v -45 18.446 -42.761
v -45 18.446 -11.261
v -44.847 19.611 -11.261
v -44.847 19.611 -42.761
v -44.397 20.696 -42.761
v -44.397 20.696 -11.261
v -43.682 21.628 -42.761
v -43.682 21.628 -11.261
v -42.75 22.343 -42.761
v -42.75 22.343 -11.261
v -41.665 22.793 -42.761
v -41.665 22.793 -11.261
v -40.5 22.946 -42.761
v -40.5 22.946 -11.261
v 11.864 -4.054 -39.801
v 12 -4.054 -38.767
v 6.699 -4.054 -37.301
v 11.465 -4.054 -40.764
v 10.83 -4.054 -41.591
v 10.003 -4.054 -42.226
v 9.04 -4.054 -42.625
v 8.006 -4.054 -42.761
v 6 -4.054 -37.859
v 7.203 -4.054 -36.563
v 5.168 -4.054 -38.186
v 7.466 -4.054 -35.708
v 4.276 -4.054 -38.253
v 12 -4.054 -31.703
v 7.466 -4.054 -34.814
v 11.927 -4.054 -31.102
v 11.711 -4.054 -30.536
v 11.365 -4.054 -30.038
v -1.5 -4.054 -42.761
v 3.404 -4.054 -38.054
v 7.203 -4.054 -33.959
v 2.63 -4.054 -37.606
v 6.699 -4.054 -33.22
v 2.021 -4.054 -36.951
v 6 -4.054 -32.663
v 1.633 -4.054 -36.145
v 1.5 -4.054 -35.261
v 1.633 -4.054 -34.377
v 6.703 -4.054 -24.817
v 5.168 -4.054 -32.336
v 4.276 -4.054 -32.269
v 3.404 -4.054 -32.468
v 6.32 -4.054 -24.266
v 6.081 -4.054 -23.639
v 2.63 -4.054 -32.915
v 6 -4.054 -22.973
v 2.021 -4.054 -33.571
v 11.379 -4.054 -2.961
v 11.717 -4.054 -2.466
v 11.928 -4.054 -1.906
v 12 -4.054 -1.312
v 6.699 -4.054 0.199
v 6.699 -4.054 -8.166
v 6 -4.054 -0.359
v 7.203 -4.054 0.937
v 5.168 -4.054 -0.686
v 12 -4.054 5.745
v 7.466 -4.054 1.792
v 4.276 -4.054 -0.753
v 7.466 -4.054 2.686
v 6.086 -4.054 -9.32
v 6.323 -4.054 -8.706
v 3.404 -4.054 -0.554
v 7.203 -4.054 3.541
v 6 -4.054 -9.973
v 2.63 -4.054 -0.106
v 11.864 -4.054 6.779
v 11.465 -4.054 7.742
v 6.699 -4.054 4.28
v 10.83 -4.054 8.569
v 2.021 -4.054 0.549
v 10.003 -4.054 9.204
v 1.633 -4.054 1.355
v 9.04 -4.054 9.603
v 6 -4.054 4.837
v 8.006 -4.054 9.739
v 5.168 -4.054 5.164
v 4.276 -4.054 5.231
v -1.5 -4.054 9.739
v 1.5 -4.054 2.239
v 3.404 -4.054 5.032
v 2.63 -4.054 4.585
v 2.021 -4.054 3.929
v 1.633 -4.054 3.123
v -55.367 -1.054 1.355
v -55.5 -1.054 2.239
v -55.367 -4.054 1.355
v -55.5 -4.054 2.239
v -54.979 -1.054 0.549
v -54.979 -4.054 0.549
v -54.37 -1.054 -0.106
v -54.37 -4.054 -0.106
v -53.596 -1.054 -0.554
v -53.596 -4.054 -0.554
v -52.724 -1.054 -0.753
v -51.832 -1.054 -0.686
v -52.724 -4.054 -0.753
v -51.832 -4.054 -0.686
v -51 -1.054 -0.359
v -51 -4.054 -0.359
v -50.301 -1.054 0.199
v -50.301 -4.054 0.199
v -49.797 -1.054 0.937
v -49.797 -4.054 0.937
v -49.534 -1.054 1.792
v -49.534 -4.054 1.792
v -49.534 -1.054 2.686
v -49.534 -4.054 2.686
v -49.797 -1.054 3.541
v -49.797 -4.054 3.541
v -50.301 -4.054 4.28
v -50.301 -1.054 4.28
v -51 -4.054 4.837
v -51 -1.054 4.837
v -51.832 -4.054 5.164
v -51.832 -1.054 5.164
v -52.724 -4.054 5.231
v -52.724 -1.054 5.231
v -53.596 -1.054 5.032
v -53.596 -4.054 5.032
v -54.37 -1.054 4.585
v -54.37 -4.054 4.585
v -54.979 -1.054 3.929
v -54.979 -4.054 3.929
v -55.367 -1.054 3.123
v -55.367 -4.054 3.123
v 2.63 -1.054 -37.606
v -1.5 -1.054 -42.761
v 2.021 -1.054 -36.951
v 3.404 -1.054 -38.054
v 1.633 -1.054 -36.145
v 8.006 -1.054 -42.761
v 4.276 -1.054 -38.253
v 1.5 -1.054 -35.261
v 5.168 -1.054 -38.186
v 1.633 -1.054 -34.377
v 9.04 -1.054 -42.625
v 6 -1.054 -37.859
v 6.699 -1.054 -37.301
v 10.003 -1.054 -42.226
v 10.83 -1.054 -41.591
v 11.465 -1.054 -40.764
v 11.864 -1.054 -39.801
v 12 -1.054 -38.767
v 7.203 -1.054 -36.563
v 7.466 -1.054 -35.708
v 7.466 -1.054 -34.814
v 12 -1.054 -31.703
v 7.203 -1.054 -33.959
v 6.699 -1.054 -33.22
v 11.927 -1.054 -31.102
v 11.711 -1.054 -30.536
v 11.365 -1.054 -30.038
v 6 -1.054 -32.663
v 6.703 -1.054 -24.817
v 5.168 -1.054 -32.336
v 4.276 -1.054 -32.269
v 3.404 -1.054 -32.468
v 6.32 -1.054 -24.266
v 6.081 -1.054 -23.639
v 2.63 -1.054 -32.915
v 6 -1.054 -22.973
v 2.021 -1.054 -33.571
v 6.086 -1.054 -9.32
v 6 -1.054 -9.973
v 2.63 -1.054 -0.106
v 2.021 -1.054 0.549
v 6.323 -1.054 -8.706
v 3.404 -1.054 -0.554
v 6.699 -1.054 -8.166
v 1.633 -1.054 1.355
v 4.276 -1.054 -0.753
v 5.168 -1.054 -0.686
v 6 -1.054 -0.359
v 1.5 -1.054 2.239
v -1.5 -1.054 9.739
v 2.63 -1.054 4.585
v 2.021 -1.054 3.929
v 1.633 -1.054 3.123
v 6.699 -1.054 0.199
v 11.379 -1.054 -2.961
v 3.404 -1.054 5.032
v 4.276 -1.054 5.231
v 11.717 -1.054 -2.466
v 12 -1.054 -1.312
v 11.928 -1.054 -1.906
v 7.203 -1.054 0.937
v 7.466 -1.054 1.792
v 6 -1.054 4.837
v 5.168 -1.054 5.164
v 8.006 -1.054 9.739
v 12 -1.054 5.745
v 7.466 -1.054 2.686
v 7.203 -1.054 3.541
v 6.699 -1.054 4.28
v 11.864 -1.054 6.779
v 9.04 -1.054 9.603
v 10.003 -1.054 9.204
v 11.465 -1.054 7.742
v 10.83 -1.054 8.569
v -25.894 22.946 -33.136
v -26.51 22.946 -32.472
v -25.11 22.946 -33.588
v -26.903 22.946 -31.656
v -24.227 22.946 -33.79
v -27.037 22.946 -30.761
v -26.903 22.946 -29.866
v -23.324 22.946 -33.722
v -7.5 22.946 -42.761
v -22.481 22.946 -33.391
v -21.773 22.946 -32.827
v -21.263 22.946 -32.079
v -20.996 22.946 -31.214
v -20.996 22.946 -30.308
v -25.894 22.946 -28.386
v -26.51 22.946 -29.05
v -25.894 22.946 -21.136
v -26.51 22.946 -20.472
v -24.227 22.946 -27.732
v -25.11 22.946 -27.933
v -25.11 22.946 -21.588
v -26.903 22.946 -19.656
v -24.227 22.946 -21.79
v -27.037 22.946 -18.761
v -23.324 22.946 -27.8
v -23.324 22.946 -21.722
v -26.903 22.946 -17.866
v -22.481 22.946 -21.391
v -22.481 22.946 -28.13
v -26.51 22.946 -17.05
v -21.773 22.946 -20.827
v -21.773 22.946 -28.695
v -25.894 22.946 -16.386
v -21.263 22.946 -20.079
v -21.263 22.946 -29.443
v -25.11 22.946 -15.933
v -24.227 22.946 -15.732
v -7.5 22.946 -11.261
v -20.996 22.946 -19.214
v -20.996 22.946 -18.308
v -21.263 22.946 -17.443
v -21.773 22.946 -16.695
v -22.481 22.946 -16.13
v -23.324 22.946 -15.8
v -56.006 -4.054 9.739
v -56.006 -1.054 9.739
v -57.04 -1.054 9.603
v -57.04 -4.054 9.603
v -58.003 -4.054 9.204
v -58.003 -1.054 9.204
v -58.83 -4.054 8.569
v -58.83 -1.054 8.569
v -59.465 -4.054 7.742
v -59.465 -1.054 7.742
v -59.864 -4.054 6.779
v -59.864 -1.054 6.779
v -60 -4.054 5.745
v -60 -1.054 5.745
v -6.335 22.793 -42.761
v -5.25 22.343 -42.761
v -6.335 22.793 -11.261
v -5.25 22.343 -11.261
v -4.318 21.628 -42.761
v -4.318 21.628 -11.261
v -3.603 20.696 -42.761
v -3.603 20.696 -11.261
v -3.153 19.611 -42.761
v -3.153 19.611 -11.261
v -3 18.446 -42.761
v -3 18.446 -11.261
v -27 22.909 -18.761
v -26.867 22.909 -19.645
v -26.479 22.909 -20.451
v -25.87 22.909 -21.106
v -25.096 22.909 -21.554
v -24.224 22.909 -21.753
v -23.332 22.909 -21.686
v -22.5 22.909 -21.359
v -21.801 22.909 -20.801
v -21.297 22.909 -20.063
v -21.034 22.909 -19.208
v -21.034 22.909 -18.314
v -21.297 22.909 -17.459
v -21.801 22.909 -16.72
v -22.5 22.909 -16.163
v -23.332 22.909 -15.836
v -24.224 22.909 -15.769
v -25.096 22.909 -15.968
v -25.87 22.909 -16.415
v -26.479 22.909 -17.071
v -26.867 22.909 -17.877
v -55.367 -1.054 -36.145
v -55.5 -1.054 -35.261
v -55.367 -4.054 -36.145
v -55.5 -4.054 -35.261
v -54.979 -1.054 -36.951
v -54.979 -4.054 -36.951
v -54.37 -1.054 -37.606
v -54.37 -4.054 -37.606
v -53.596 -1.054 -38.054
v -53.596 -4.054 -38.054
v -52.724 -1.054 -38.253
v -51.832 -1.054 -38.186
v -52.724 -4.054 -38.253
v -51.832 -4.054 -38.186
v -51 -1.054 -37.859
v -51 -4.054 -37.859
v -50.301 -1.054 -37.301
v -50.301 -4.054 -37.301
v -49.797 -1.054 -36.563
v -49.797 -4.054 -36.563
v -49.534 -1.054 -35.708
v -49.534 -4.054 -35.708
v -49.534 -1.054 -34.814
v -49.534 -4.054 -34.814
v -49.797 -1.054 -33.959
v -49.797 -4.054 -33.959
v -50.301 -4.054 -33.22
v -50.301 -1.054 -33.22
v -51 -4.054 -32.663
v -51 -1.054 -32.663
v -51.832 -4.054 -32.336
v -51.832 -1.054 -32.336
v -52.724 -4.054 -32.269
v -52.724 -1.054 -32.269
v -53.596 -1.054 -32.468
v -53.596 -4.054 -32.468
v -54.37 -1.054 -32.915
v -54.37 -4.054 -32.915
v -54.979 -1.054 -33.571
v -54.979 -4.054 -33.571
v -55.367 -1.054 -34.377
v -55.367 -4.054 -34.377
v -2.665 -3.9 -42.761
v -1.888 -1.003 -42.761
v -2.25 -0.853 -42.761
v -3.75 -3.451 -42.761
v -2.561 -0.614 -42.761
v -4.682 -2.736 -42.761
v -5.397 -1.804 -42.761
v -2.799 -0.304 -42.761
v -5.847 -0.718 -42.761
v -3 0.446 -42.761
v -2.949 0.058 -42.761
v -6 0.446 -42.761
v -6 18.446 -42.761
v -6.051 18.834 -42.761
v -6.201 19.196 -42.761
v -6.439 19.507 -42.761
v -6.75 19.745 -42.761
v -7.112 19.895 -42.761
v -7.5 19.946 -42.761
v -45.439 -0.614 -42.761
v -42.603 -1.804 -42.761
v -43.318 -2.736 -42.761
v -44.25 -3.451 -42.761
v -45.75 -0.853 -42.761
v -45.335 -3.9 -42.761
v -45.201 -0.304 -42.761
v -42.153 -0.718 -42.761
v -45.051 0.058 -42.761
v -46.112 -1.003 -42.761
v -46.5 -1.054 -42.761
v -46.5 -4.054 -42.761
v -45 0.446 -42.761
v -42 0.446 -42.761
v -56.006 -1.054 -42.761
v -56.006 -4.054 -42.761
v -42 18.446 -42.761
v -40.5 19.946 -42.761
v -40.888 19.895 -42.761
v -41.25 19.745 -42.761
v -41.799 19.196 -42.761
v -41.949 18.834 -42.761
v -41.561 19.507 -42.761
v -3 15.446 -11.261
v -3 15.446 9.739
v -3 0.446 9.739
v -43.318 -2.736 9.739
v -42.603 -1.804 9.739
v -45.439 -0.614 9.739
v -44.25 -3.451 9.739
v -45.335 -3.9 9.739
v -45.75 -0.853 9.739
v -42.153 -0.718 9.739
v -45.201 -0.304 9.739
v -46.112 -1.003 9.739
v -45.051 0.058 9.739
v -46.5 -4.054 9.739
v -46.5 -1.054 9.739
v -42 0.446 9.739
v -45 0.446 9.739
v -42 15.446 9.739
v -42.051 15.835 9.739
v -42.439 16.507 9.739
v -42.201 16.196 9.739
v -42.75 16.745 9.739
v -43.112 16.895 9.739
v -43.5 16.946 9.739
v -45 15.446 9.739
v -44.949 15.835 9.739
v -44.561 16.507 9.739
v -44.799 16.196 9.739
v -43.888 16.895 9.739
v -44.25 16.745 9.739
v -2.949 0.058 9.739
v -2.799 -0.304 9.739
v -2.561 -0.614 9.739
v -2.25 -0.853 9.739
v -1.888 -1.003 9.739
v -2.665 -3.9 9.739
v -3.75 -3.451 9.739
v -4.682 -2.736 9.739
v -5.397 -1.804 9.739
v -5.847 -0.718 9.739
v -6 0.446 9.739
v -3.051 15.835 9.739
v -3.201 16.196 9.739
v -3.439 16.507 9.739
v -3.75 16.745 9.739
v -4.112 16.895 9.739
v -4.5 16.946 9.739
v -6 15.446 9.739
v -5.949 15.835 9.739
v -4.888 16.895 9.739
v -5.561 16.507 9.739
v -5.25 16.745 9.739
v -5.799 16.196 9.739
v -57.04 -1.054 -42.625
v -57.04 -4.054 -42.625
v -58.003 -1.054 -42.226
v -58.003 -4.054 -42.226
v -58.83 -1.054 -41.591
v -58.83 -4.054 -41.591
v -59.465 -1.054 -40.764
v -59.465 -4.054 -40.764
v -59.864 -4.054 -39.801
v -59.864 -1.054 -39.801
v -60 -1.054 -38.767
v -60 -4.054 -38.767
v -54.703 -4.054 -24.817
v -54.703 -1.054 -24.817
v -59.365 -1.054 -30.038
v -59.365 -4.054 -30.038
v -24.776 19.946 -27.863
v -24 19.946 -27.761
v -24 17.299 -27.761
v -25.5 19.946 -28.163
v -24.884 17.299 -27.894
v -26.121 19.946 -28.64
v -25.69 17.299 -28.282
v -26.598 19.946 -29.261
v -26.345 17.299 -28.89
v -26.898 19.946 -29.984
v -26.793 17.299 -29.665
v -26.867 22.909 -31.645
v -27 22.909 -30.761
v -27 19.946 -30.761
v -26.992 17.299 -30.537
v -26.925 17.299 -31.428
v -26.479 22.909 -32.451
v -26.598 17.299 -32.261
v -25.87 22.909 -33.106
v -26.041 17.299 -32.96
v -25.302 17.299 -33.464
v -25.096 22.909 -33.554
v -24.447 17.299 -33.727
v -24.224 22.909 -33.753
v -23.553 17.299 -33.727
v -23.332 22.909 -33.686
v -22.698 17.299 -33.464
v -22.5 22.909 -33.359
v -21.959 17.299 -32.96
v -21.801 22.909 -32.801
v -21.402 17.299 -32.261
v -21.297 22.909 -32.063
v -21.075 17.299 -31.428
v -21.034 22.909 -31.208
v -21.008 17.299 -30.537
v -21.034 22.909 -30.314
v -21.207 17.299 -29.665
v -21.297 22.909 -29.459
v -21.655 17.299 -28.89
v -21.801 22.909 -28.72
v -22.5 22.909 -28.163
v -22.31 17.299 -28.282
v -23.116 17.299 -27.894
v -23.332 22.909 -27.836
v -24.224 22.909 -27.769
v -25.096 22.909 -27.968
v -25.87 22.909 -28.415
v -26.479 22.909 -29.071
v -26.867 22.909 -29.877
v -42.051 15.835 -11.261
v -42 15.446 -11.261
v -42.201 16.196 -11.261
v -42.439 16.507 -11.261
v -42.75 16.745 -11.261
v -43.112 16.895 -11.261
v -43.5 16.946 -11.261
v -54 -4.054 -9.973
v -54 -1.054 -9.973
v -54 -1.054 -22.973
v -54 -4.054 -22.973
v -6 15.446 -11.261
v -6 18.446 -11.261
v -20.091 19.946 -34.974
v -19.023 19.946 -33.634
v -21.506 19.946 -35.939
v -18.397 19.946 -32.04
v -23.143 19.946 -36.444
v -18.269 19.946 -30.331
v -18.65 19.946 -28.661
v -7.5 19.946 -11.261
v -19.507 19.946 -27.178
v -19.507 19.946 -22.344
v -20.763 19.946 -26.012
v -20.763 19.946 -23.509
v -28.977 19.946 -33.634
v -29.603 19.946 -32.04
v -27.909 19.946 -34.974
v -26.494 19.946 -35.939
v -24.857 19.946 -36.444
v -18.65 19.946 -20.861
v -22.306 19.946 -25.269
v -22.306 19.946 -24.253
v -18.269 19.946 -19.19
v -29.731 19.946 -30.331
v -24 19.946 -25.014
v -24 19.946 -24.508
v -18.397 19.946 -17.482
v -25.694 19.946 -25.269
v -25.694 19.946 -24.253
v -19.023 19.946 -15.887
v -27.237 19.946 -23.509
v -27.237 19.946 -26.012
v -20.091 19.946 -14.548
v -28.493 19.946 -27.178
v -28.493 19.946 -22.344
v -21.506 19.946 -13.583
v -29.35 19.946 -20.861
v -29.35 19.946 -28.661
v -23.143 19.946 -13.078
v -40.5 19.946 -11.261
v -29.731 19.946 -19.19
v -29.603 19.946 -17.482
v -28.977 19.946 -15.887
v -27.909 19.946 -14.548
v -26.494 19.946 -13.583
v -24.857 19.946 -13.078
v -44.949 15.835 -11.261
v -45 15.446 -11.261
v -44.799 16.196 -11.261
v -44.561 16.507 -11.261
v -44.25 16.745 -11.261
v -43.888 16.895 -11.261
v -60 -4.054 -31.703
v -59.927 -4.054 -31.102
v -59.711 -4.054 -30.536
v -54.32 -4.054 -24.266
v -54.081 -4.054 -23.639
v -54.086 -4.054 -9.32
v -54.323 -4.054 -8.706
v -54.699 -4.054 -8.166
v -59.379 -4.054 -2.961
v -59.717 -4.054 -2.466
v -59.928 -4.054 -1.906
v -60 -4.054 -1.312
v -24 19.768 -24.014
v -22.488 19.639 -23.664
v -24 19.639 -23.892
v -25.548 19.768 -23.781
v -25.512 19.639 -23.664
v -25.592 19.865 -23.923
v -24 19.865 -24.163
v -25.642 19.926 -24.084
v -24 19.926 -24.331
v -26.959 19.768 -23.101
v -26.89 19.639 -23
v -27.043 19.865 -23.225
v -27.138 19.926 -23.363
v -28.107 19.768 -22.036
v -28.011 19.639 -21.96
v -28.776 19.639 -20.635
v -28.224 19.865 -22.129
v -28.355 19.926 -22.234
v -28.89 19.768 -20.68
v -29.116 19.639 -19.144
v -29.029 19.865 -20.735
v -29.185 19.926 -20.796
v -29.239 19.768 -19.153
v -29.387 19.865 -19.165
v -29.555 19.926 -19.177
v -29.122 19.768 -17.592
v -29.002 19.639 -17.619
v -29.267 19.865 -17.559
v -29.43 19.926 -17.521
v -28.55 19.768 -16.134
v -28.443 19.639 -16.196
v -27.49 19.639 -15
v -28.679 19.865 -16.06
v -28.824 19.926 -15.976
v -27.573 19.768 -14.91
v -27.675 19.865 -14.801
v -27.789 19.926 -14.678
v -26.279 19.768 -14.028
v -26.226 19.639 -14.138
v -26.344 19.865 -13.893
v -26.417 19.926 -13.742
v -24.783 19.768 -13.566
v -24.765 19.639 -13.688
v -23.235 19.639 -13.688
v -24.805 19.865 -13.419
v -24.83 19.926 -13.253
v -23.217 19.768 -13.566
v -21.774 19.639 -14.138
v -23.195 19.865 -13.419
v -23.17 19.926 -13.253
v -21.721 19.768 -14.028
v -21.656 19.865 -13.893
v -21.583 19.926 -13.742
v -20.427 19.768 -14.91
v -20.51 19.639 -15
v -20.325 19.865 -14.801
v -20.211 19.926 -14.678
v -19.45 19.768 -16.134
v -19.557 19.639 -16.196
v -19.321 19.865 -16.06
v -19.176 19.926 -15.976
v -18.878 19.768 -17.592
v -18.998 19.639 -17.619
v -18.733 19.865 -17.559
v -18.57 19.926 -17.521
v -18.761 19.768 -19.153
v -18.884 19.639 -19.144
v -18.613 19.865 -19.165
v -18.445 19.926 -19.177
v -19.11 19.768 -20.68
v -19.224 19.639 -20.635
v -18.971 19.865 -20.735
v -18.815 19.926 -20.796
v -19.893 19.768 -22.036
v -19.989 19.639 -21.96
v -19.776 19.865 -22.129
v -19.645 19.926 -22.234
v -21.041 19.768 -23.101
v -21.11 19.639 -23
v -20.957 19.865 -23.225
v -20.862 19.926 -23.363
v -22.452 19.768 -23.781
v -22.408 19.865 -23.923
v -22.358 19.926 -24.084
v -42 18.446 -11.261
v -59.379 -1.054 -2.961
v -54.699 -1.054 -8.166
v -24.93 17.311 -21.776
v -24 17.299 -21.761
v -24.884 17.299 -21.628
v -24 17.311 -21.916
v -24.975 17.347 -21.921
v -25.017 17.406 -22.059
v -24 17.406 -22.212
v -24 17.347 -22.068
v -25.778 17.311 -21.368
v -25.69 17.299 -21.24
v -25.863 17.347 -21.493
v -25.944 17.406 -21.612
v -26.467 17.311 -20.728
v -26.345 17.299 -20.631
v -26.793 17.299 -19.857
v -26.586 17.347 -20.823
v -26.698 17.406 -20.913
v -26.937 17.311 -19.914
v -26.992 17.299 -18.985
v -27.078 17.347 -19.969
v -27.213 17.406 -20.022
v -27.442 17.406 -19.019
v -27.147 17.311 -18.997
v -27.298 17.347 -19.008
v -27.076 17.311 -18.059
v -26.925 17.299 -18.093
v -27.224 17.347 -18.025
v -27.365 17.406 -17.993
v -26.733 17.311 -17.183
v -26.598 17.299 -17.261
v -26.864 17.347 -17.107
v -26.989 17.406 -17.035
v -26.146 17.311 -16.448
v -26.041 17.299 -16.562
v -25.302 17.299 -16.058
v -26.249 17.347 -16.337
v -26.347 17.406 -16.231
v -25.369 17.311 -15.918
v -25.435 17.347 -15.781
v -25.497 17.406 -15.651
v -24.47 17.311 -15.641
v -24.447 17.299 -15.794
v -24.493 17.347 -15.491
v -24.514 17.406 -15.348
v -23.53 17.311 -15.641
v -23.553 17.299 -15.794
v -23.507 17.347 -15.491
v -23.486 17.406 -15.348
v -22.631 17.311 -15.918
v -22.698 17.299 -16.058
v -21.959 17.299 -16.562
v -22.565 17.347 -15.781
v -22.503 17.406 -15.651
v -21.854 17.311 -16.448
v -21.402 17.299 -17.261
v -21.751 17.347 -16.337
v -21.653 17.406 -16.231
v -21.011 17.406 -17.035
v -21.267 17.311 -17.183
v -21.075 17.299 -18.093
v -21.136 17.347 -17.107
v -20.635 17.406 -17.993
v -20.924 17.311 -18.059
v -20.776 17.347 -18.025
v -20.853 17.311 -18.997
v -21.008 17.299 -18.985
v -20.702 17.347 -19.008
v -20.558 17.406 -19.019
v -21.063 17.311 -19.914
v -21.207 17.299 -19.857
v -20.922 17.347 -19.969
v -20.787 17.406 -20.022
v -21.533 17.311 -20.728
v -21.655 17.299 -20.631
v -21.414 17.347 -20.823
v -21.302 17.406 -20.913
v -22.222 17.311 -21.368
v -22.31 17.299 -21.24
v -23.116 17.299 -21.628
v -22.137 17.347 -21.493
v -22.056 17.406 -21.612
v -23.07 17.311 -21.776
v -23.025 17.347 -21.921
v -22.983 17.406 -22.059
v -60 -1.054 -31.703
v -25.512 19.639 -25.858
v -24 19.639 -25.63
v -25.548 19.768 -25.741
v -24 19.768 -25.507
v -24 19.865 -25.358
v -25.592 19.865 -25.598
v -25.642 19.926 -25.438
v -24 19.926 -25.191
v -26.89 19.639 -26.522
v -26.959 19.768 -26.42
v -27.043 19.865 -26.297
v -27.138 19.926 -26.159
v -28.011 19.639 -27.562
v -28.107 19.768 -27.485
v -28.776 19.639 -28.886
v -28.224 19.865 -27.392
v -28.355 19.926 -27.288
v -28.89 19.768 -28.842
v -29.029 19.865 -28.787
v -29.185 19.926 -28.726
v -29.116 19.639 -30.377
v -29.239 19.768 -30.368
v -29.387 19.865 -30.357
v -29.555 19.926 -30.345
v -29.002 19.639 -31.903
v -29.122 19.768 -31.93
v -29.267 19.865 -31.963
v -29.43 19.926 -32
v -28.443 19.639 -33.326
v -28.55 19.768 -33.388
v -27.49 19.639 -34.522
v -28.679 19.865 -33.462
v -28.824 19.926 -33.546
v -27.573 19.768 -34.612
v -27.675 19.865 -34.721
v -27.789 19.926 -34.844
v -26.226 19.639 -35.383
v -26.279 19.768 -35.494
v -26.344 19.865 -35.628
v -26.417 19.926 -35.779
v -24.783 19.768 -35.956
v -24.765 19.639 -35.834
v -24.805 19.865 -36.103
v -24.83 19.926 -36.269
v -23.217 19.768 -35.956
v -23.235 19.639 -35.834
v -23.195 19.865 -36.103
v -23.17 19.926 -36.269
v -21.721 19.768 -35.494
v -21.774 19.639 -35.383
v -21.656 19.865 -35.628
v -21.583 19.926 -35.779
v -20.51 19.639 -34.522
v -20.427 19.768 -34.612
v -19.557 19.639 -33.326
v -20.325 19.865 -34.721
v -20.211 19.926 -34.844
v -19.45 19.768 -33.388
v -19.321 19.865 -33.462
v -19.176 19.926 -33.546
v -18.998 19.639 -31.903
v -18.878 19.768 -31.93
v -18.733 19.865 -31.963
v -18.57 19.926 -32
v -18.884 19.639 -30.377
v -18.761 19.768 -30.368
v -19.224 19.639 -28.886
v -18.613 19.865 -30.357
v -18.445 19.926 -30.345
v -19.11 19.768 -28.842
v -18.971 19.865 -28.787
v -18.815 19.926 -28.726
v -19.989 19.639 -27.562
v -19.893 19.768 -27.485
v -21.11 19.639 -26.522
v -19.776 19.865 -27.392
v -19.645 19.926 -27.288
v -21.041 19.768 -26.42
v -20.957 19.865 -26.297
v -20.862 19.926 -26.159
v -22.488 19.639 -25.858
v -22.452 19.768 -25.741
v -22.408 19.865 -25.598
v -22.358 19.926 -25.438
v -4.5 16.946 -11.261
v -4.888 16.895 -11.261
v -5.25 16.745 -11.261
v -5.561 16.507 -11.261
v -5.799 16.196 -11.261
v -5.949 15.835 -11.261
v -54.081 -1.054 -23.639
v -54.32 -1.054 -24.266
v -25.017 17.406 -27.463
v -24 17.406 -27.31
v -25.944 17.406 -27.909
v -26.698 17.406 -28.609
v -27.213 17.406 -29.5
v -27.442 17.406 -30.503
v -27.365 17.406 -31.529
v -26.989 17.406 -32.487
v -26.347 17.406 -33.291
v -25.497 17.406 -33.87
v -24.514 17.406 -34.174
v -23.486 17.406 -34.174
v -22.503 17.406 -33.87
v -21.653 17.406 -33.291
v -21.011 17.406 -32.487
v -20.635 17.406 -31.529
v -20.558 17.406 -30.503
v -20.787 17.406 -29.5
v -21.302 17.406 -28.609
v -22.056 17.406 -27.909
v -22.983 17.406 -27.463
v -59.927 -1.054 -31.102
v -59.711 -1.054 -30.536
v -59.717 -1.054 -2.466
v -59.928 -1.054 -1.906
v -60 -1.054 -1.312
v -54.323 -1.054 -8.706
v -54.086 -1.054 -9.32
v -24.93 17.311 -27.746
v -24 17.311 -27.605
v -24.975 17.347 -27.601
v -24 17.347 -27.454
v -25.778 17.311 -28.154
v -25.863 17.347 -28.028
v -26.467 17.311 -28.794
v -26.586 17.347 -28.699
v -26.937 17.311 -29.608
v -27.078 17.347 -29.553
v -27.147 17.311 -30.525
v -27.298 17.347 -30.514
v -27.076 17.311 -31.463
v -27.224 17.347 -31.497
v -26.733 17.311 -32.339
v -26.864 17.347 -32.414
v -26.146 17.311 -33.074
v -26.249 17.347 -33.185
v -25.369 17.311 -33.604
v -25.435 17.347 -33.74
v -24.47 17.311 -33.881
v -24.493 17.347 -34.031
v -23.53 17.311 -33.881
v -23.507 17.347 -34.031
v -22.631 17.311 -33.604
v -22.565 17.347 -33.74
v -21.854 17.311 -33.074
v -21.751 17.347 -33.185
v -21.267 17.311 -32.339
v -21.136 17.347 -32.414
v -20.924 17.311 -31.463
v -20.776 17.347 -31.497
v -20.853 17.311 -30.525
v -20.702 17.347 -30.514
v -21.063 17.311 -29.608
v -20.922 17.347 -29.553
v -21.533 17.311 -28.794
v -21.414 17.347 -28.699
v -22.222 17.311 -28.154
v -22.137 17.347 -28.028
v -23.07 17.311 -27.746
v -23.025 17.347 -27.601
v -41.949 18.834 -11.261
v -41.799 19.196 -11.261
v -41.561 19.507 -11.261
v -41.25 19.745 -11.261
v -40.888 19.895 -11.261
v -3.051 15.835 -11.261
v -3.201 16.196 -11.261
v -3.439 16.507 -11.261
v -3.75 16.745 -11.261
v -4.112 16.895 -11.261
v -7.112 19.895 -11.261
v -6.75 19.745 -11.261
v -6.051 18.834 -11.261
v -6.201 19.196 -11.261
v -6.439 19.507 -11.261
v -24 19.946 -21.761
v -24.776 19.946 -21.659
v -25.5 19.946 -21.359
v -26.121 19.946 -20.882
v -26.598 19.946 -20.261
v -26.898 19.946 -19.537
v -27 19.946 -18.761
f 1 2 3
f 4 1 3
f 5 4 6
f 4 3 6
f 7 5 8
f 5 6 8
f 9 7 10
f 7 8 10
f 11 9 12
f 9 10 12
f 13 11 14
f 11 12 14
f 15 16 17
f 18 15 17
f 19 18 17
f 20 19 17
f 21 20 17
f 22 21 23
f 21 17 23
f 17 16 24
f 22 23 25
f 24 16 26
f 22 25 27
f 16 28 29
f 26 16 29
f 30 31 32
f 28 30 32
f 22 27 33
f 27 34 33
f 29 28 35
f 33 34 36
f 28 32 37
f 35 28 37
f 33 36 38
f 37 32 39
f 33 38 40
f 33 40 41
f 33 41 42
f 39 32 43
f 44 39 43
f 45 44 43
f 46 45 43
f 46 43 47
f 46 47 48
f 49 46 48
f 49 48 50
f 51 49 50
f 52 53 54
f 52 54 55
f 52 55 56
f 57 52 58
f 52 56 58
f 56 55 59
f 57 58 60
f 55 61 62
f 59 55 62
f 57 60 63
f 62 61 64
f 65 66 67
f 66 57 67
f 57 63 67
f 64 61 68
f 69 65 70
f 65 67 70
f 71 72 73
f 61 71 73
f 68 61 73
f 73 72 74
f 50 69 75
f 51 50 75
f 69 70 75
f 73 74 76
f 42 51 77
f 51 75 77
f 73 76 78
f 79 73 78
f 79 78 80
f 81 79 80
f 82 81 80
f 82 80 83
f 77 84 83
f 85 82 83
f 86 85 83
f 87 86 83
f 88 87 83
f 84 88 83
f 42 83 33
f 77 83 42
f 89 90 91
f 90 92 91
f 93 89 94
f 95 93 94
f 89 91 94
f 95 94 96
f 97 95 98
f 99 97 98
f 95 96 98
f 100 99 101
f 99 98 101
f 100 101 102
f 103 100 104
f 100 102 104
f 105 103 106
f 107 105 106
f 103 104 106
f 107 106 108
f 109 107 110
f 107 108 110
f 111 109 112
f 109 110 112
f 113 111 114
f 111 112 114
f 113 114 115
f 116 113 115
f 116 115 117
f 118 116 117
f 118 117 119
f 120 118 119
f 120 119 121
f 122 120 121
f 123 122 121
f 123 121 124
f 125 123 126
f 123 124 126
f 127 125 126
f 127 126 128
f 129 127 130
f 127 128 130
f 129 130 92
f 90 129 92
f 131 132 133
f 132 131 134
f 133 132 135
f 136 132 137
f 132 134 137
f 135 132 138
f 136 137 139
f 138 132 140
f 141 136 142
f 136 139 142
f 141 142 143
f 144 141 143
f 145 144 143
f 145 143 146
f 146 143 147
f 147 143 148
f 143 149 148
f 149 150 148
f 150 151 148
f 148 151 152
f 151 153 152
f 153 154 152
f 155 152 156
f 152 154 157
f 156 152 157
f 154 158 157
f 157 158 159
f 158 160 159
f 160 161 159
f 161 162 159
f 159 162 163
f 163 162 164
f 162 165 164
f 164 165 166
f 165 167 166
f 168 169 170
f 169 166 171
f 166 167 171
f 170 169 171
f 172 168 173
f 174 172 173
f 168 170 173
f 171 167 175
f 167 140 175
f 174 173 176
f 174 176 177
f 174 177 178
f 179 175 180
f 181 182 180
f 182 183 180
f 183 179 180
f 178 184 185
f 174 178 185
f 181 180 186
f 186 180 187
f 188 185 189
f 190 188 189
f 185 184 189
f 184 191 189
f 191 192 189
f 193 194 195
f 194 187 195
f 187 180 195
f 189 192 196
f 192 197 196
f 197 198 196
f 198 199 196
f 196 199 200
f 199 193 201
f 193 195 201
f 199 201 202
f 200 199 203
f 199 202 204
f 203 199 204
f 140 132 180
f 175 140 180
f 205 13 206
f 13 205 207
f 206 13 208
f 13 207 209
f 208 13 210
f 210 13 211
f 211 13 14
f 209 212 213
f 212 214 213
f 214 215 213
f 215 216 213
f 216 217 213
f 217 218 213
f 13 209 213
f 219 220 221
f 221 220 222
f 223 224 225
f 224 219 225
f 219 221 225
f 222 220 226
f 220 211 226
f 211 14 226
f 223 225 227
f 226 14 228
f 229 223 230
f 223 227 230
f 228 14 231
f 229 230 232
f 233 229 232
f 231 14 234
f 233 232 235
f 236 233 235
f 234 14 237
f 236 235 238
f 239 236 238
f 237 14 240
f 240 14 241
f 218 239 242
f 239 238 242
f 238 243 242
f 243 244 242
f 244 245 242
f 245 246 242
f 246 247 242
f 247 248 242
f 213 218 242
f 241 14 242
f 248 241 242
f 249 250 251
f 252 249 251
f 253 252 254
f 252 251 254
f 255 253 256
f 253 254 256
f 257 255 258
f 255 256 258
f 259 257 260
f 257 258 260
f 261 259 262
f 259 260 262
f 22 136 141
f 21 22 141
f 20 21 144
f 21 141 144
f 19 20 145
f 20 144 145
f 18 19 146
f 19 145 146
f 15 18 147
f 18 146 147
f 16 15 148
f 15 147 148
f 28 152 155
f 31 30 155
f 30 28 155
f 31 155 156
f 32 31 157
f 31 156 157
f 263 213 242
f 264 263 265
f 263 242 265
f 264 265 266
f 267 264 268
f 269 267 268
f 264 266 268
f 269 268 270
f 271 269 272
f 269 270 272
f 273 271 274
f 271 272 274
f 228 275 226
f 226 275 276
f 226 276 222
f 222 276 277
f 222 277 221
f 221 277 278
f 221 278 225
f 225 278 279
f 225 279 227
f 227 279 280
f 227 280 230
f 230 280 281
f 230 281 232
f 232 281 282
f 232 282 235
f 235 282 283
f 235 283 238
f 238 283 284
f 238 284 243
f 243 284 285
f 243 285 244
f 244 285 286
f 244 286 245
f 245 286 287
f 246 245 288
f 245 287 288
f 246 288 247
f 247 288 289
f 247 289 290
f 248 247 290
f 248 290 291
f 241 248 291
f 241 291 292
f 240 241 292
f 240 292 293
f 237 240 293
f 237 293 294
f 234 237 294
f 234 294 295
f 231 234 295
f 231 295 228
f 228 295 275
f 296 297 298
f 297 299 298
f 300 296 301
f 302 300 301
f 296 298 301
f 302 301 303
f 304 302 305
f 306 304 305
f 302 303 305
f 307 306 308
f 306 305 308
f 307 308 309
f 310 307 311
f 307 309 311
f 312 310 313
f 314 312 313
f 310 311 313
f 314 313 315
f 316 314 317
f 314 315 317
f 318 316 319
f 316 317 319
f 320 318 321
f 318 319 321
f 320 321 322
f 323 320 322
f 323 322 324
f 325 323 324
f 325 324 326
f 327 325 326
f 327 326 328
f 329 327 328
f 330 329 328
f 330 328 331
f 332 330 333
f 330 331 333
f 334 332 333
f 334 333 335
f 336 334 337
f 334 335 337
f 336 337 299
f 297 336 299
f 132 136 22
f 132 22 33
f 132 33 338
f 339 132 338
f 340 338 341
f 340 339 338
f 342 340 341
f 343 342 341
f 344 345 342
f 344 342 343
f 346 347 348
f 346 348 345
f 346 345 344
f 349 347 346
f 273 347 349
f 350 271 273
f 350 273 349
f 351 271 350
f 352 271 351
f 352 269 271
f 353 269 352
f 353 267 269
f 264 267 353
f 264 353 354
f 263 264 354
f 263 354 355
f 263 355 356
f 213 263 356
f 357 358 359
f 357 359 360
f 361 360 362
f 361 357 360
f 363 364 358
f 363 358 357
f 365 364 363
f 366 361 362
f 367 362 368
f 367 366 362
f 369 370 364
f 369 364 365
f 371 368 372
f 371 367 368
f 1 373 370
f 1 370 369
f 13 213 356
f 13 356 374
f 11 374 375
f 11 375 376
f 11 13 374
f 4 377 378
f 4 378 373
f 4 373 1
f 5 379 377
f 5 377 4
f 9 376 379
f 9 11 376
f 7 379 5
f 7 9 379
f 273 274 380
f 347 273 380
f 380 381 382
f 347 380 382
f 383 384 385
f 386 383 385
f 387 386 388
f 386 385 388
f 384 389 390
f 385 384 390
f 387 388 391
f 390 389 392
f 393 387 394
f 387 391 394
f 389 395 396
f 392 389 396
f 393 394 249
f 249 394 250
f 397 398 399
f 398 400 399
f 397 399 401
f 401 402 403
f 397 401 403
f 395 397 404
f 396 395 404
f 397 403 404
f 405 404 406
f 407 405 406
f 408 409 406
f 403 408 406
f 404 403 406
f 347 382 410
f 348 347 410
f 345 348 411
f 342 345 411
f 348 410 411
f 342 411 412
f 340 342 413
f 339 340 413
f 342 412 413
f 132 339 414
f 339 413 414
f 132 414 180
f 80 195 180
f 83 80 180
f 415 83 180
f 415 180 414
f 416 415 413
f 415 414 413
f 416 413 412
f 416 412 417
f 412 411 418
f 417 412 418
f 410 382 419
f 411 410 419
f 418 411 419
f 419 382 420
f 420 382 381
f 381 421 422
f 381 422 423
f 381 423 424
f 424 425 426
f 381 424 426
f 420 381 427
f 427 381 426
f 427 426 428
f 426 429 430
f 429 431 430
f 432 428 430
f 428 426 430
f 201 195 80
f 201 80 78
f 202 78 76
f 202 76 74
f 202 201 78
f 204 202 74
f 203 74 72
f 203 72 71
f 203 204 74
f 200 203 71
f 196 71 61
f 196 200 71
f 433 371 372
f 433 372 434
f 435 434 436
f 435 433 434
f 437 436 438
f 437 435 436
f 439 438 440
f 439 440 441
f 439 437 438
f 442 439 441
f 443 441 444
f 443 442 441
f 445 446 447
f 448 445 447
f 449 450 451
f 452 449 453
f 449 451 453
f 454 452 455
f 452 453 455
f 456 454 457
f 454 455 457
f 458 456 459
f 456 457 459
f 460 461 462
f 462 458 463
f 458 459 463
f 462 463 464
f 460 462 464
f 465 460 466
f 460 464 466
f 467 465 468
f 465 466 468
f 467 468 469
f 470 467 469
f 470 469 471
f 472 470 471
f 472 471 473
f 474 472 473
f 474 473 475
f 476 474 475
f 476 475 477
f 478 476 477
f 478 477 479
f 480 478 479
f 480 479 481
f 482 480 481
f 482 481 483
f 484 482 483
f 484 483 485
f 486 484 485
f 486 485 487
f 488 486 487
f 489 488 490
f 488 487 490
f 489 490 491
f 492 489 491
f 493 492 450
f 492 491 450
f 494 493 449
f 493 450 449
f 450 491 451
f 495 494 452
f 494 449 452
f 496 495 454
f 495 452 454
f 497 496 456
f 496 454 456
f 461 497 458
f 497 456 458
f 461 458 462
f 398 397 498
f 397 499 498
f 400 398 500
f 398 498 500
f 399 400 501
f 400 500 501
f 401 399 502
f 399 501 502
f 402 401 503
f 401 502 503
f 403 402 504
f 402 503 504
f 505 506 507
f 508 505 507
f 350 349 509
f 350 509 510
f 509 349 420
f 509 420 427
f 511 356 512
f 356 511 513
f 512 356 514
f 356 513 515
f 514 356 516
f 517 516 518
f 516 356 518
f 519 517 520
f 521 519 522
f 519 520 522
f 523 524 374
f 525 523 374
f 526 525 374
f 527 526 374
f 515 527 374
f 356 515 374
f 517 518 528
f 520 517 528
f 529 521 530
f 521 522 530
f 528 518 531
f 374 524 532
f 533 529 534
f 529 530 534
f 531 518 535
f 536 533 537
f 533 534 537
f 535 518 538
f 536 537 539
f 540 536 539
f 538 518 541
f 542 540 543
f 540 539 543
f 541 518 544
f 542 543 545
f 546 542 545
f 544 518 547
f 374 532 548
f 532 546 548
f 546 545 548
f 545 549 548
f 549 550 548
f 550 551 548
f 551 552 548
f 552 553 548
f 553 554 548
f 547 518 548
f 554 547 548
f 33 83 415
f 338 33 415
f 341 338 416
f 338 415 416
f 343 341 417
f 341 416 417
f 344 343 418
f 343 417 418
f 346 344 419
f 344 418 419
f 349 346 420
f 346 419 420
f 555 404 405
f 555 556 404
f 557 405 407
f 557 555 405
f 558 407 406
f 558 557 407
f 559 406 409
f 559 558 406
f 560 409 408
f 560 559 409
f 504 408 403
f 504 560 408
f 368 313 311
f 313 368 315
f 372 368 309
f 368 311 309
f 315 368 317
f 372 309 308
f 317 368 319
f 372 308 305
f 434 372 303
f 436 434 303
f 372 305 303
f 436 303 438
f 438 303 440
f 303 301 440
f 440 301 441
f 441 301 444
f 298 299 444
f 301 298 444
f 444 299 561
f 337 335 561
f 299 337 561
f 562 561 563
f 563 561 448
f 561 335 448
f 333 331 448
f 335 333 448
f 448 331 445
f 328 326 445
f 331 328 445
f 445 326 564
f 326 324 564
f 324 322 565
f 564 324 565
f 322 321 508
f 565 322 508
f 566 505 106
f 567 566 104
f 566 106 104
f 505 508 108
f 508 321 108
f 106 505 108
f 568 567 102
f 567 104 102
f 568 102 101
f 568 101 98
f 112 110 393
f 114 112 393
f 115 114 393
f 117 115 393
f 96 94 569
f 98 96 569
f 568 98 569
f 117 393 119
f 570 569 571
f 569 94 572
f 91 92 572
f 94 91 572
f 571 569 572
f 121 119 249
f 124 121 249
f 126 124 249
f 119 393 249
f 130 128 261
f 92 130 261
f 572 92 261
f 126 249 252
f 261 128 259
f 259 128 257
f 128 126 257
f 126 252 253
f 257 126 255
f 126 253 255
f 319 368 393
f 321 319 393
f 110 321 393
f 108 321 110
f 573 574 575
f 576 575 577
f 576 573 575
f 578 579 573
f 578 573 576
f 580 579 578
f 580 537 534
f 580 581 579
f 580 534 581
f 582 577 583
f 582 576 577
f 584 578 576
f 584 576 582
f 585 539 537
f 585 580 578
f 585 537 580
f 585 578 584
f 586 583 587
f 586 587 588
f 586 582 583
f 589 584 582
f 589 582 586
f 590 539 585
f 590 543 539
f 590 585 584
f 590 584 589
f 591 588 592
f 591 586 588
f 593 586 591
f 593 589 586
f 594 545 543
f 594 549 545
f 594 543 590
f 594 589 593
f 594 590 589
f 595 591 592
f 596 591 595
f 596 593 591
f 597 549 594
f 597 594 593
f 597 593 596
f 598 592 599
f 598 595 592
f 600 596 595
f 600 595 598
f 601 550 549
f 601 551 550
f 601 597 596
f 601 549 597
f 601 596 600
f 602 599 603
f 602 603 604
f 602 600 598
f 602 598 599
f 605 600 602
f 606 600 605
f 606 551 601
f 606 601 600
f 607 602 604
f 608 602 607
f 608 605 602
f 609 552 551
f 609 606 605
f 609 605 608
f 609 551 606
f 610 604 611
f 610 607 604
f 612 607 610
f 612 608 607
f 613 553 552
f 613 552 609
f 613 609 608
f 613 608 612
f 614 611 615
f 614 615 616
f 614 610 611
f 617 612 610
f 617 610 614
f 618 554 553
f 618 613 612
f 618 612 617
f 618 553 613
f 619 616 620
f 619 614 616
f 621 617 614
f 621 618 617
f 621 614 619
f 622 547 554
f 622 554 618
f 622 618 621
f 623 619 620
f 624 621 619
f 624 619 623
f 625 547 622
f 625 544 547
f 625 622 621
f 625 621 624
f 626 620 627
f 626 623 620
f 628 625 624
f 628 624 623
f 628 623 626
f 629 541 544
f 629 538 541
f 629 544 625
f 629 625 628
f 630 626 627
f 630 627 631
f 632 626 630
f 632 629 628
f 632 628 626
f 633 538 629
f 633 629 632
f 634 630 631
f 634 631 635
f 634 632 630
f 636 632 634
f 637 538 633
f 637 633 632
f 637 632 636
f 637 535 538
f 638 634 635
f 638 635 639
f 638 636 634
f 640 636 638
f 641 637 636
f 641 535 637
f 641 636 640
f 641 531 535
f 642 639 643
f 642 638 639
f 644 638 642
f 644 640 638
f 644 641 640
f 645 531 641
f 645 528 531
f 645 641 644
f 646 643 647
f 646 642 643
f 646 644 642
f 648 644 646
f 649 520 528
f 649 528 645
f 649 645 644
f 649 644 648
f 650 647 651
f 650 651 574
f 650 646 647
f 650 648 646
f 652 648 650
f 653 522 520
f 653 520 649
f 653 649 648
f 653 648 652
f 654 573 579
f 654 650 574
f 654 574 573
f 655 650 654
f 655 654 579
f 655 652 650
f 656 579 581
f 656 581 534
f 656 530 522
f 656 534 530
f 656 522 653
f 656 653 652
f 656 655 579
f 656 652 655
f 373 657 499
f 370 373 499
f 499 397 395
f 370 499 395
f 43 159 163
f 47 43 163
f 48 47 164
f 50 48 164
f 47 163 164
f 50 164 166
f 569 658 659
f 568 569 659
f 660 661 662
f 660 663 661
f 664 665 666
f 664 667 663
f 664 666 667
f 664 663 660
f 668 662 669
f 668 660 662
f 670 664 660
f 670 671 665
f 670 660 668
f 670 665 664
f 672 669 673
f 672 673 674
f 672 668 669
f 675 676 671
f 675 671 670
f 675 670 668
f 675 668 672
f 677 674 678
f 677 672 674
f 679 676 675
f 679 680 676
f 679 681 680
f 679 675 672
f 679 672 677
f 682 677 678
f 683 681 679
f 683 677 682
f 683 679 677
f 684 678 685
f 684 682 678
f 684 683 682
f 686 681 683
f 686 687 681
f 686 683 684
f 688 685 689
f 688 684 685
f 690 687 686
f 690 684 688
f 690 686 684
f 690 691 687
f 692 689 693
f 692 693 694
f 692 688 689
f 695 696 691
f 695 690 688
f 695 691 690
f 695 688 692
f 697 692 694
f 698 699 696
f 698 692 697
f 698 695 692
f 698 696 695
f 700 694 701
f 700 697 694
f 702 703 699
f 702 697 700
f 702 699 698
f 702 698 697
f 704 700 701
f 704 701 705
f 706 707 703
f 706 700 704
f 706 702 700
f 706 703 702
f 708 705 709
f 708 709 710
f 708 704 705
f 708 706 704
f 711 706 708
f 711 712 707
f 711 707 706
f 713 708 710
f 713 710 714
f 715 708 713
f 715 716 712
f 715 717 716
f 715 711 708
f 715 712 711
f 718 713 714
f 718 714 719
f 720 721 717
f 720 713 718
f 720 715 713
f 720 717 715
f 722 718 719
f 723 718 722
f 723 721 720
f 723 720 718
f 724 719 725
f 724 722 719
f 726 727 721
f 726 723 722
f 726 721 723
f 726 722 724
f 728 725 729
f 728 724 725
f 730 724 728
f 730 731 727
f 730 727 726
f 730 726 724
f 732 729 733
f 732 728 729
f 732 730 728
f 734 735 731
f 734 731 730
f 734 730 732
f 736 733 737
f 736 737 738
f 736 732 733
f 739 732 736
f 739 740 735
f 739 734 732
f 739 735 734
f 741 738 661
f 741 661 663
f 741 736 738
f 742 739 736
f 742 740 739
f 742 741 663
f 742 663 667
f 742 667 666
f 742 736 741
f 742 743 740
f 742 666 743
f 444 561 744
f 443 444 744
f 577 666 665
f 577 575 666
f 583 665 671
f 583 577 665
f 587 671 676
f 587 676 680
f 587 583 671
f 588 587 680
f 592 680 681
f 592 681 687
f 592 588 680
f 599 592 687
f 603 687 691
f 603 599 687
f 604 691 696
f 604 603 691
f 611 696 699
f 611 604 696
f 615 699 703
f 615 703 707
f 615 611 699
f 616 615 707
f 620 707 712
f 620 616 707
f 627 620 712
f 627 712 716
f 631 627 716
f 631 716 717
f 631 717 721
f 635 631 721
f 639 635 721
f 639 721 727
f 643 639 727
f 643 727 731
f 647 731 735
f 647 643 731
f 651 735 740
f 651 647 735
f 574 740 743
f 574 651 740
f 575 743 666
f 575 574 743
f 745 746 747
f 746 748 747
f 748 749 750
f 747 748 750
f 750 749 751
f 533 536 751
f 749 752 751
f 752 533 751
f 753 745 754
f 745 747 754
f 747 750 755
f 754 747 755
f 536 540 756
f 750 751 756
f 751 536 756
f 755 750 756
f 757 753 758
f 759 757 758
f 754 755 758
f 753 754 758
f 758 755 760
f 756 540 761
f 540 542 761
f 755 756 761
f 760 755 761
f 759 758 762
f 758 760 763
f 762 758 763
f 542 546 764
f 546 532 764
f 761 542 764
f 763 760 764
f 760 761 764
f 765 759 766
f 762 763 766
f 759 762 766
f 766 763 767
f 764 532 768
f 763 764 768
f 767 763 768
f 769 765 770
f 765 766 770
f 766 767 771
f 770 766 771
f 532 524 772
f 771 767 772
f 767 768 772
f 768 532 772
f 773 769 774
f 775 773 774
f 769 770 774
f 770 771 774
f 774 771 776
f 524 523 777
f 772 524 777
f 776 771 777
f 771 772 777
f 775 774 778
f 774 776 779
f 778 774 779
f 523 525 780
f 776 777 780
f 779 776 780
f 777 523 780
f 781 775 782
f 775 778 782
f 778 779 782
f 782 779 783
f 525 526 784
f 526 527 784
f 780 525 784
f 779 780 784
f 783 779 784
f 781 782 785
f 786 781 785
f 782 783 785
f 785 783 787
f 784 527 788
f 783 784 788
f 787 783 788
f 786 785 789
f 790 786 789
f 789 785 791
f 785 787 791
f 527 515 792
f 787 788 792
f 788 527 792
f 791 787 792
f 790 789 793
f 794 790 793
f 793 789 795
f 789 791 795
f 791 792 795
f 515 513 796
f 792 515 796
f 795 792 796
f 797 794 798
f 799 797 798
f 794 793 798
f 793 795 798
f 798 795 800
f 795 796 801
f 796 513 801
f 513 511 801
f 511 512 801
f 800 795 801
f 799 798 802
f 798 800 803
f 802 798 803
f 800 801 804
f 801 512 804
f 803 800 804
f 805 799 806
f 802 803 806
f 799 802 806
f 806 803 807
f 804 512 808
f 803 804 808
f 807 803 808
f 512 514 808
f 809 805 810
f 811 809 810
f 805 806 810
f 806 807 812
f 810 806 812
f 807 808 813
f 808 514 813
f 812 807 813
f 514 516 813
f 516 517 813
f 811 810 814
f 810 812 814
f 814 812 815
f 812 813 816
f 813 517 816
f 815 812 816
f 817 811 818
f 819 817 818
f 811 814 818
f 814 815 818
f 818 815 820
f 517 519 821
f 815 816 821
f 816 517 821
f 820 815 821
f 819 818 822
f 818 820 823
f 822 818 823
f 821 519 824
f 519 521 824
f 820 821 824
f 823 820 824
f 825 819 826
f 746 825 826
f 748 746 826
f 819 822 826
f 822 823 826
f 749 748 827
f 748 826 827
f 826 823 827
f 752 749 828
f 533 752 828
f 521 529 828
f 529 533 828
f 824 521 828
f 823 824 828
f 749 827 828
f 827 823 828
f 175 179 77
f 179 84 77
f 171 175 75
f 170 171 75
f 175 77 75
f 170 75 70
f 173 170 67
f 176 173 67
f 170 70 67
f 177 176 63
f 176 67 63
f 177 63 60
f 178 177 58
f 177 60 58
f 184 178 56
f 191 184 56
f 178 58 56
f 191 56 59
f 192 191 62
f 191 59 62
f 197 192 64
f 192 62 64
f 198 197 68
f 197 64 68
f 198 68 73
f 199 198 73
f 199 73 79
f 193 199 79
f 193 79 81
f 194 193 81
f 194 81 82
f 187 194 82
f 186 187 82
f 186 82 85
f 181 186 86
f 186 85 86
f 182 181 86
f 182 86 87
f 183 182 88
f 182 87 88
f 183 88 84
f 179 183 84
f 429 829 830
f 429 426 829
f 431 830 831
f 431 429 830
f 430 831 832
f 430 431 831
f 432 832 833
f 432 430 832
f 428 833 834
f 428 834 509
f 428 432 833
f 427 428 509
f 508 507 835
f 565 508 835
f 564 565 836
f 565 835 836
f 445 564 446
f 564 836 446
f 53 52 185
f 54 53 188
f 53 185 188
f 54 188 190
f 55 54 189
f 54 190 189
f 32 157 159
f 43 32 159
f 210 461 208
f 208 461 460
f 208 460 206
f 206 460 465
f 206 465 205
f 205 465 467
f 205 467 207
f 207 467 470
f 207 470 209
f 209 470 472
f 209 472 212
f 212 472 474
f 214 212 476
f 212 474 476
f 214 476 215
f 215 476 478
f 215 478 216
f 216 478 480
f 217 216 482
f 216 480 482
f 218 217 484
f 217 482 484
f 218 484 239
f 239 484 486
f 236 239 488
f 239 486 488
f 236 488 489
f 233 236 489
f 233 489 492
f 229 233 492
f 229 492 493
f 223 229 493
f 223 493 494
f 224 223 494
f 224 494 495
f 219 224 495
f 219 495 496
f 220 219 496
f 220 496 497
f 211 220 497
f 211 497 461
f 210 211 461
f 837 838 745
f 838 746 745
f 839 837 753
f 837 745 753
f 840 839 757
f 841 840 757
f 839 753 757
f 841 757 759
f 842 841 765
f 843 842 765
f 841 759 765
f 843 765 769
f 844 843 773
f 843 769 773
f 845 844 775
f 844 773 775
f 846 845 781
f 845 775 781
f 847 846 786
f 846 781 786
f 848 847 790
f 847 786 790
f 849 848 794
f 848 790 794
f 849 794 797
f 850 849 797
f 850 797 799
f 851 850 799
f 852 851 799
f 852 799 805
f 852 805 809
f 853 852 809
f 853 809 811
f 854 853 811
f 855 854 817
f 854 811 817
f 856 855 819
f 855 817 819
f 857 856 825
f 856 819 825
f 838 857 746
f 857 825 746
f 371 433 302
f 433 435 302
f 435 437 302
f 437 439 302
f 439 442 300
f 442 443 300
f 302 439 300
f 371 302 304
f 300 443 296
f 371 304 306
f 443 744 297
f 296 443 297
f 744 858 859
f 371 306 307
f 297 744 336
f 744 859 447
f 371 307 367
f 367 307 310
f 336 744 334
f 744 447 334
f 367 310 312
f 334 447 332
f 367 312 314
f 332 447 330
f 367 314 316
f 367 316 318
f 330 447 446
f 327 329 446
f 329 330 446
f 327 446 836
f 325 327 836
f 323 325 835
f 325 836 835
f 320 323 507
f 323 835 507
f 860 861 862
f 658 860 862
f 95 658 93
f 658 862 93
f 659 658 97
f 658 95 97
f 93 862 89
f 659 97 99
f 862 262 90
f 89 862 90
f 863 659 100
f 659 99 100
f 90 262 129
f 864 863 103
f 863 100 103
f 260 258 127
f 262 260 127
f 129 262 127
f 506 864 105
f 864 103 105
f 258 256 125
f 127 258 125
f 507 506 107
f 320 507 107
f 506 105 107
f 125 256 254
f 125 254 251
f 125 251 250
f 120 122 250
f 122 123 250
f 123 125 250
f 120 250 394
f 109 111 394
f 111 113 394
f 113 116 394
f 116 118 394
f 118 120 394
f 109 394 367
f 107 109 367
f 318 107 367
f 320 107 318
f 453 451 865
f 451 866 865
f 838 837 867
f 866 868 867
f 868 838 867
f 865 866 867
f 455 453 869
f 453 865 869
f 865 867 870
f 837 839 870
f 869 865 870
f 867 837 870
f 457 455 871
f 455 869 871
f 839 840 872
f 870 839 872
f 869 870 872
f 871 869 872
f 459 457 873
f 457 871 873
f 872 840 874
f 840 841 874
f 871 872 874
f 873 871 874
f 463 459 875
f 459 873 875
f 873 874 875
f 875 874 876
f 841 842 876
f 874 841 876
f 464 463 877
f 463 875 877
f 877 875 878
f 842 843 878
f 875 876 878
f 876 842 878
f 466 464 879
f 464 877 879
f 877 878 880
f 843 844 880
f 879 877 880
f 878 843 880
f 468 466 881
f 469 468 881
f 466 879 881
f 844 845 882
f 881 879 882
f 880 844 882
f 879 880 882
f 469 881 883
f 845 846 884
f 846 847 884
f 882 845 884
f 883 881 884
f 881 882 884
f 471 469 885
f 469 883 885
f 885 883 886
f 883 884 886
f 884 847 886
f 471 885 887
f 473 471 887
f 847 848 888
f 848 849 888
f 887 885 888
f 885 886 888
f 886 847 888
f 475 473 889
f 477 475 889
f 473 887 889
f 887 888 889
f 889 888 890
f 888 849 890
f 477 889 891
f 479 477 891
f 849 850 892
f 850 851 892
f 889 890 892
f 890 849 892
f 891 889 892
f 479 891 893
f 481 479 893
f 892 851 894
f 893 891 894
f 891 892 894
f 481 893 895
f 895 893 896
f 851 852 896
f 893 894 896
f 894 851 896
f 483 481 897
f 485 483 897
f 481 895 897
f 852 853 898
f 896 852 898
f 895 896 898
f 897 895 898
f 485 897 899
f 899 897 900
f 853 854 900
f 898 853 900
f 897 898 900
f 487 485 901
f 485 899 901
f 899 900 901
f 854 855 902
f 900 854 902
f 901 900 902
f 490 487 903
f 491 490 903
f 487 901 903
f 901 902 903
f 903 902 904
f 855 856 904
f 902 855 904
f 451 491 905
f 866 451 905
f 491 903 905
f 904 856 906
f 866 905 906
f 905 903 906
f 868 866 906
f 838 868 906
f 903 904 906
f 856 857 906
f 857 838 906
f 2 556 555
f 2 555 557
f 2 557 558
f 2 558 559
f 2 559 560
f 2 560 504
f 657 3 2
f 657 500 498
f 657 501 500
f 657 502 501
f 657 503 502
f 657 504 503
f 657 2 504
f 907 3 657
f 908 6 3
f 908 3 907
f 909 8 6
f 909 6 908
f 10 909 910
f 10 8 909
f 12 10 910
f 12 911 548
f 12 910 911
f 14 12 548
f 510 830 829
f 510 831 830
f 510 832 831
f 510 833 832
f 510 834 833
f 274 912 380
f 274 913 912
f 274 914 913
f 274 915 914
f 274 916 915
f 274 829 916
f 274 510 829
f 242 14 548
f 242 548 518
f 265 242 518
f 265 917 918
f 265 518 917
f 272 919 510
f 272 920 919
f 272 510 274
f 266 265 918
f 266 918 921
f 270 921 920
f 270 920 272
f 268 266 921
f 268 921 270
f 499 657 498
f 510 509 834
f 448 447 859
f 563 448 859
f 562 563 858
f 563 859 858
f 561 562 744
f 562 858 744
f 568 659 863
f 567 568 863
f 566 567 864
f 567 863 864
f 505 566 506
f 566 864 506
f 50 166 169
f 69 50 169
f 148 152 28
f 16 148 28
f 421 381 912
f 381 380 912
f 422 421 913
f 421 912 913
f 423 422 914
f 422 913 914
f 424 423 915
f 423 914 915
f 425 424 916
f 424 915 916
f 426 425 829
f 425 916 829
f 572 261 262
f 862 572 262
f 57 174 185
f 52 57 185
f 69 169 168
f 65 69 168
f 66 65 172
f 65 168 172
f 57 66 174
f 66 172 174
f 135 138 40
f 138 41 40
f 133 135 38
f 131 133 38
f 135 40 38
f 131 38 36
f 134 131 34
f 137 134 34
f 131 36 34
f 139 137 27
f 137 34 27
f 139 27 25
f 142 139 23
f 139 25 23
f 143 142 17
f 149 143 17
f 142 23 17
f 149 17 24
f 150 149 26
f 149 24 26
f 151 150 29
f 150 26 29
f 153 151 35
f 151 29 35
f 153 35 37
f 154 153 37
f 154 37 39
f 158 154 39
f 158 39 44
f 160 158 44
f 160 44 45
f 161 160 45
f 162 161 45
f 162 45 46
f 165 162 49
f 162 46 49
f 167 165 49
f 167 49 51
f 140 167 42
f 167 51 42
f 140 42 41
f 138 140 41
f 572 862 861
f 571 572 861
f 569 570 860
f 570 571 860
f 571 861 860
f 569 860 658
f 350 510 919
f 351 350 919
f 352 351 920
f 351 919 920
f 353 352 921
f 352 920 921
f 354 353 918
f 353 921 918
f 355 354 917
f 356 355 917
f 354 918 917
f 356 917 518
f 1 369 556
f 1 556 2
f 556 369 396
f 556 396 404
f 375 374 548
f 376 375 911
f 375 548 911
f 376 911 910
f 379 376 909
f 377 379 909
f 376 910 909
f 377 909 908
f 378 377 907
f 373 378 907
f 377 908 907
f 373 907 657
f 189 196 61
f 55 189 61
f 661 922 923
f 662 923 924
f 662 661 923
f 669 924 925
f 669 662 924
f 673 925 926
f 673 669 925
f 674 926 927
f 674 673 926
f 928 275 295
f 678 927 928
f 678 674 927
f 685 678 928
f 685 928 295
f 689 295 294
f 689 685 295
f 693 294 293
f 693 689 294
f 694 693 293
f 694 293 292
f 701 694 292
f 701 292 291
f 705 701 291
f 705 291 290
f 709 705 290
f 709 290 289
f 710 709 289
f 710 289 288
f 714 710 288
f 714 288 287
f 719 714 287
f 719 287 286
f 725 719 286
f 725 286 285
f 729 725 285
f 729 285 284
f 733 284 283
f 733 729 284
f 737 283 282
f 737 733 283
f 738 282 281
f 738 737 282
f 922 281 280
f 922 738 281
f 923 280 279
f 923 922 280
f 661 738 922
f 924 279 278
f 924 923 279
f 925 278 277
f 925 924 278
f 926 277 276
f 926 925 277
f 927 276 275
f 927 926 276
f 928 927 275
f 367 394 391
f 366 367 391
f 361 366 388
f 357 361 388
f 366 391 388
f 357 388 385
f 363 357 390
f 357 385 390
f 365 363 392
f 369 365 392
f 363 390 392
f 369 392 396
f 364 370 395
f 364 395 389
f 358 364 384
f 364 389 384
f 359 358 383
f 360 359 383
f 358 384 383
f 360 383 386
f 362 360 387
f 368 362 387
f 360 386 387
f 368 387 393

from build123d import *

# Parameters (mm, degrees)
BASE_FLANGE1_DEPTH                 = 35
SKETCH10_W                         = 28
SKETCH10_H                         = 14
CUT_EXTRUDE1_DEPTH                 = 4
F_4_0_4_DIAMETER_HOLE1_D           = 4
F_4_0_4_DIAMETER_HOLE1_CSINK_D     = 4.05
F_4_0_4_DIAMETER_HOLE1_CSINK_ANGLE = 90
SCALE1_SCALE                       = 1.5
CUT_EXTRUDE2_DEPTH                 = 10
CUT_EXTRUDE3_DEPTH                 = 10
FILLET1_R                          = 1.5


# Sheet-metal steps are written as plain solids
with BuildPart() as part:
    # Sketch1 → Base-Flange1 (new body)
    with BuildSketch(Plane.XY):
        with BuildLine():
            Line((0, 0), (-9, 0))
            ThreePointArc((-9, 0), (-11.121320344, 0.878679656), (-12, 3))
            Line((-12, 3), (-12, 15))
            ThreePointArc((-12, 15), (-12.292893219, 15.707106781), (-13, 16))
            Line((-13, 16), (-35, 16))
            ThreePointArc((-35, 16), (-35.707106781, 15.707106781), (-36, 15))
            Line((-36, 15), (-36, 3))
            ThreePointArc((-36, 3), (-36.878679656, 0.878679656), (-39, 0))
            Line((-39, 0), (-48, 0))
            Line((-48, 0), (-48, 2))
            Line((-48, 2), (-39, 2))
            ThreePointArc((-39, 2), (-38.292893219, 2.292893219), (-38, 3))
            Line((-38, 3), (-38, 15))
            ThreePointArc((-38, 15), (-37.121320344, 17.121320344), (-35, 18))
            Line((-35, 18), (-13, 18))
            ThreePointArc((-13, 18), (-10.878679656, 17.121320344), (-10, 15))
            Line((-10, 15), (-10, 3))
            ThreePointArc((-10, 3), (-9.707106781, 2.292893219), (-9, 2))
            Line((-9, 2), (0, 2))
            Line((0, 2), (0, 0))
        make_face()
    extrude(amount=-BASE_FLANGE1_DEPTH)

    # Sketch10 → Cut-Extrude1 (cut)
    with BuildSketch(Plane(origin=(0, 18, 0), x_dir=(1, 0, 0), z_dir=(0, 1, 0))):
        with Locations((-24, 7)):
            Rectangle(SKETCH10_W, SKETCH10_H)
    extrude(amount=-CUT_EXTRUDE1_DEPTH, mode=Mode.SUBTRACT)

    # Ø4.0 (4) Diameter Hole1 (through all)
    with Locations(Plane(origin=(0, 18, 0), x_dir=(1, 0, 0), z_dir=(0, 1, 0))):
        with Locations((-24, 27), (-24, 19), (-43, 30), (-43, 5), (-5, 30), (-5, 5)):
            CounterSinkHole(F_4_0_4_DIAMETER_HOLE1_D / 2, F_4_0_4_DIAMETER_HOLE1_CSINK_D / 2, counter_sink_angle=F_4_0_4_DIAMETER_HOLE1_CSINK_ANGLE)


with BuildPart() as part_1:
    # Scale1: scaled about (-24, 8.107482912, -19.478199083)
    add(part.part.scale(SCALE1_SCALE).moved(Location((12, -4.053741456, 9.739099541))))

    # Sketch15 → Cut-Extrude2 (cut)
    with BuildSketch(Plane(origin=(0, -1.053741456, 0), x_dir=(1, 0, 0), z_dir=(0, 1, 0))):
        with BuildLine():
            Line((-60, 38.767251784), (-60, 42.760900459))
            Line((-60, 42.760900459), (-56.006351326, 42.760900459))
            ThreePointArc((-56.006351326, 42.760900459), (-58.830287385, 41.591187844), (-60, 38.767251784))
        make_face()
        with BuildLine():
            Line((-60, -9.739099541), (-56.006351326, -9.739099541))
            ThreePointArc((-56.006351326, -9.739099541), (-58.830287385, -8.569386926), (-60, -5.745450867))
            Line((-60, -5.745450867), (-60, -9.739099541))
        make_face()
        with BuildLine():
            Line((12, -5.745450867), (12, -9.739099541))
            Line((12, -9.739099541), (8.006351326, -9.739099541))
            ThreePointArc((8.006351326, -9.739099541), (10.830287385, -8.569386926), (12, -5.745450867))
        make_face()
        with BuildLine():
            Line((12, 42.760900459), (8.006351326, 42.760900459))
            ThreePointArc((8.006351326, 42.760900459), (10.830287385, 41.591187844), (12, 38.767251784))
            Line((12, 38.767251784), (12, 42.760900459))
        make_face()
    extrude(amount=-CUT_EXTRUDE2_DEPTH, mode=Mode.SUBTRACT)

    # Sketch16 → Cut-Extrude3 (cut)
    with BuildSketch(Plane(origin=(0, -1.053741456, 0), x_dir=(1, 0, 0), z_dir=(0, 1, 0))):
        with BuildLine():
            Line((-54.703281617, 24.816516721), (-59.364976604, 30.038451214))
            ThreePointArc((-59.364976604, 30.038451214), (-59.835855465, 30.812399385), (-60, 31.703342281))
            Line((-60, 31.703342281), (-60, 1.311607043))
            ThreePointArc((-60, 1.311607043), (-59.839618442, 2.192620974), (-59.379051563, 2.960596195))
            Line((-59.379051563, 2.960596195), (-54.698537483, 8.165669485))
            ThreePointArc((-54.698537483, 8.165669485), (-54.186063754, 9.006077869), (-54, 9.972667676))
            Line((-54, 9.972667676), (-54, 22.972667676))
            ThreePointArc((-54, 22.972667676), (-54.181788316, 23.959377402), (-54.703281617, 24.816516721))
        make_face()
        with BuildLine():
            Line((11.364976604, 30.038451214), (6.703281617, 24.816516721))
            ThreePointArc((6.703281617, 24.816516721), (6.181788316, 23.959377402), (6, 22.972667676))
            Line((6, 22.972667676), (6, 9.972667676))
            ThreePointArc((6, 9.972667676), (6.186063754, 9.006077869), (6.698537483, 8.165669485))
            Line((6.698537483, 8.165669485), (11.379051563, 2.960596195))
            ThreePointArc((11.379051563, 2.960596195), (11.839618442, 2.192620974), (12, 1.311607043))
            Line((12, 1.311607043), (12, 31.703342281))
            ThreePointArc((12, 31.703342281), (11.835855465, 30.812399385), (11.364976604, 30.038451214))
        make_face()
    extrude(amount=-CUT_EXTRUDE3_DEPTH, mode=Mode.SUBTRACT)

    # Fillet1
    fillet1_edges = [part_1.edges().sort_by_distance(p)[0] for p in [
        (-3, 16.946258544, -0.760900459),
        (-45, 16.946258544, -0.760900458),
        (-6, 16.946258544, -0.760900459),
        (-42, 16.946258544, -0.760900459),
    ]]
    fillet(fillet1_edges, radius=FILLET1_R - 0.0001)  # a hair under: the kernel refuses the full size

    # Sketch18 → Revolve1 (revolve)
    with BuildSketch(Plane(origin=(0, 0, -30.760900459), x_dir=(-1, 0, 0), z_dir=(0, 0, -1)), mode=Mode.PRIVATE) as revolve1_sk:
        with BuildLine():
            Line((27, 19.946258544), (27, 17.298747157))
            ThreePointArc((27, 17.298747157), (27.231953871, 17.32602037), (27.451255487, 17.406352354))
            Line((27.451255487, 17.406352354), (29.130617451, 19.638600901))
            ThreePointArc((29.130617451, 19.638600901), (29.402592072, 19.865072033), (29.747074465, 19.946258544))
            Line((29.747074465, 19.946258544), (27, 19.946258544))
        make_face()
    revolve(revolve1_sk.sketch.rotate(Axis((-24, 22.908758544, -30.760900459), (0, -1, 0)), 270), axis=Axis((-24, 22.908758544, -30.760900459), (0, -1, 0)))

    # Sketch20 → Revolve2 (revolve)
    with BuildSketch(Plane(origin=(0, 0, -18.760900459), x_dir=(-1, 0, 0), z_dir=(0, 0, -1)), mode=Mode.PRIVATE) as revolve2_sk:
        with BuildLine():
            Line((29.747074465, 19.946258544), (27, 19.946258544))
            Line((27, 19.946258544), (27, 17.298747157))
            ThreePointArc((27, 17.298747157), (27.231953871, 17.32602037), (27.451255487, 17.406352354))
            Line((27.451255487, 17.406352354), (29.130617451, 19.638600901))
            ThreePointArc((29.130617451, 19.638600901), (29.402592072, 19.865072033), (29.747074465, 19.946258544))
        make_face()
    revolve(revolve2_sk.sketch.rotate(Axis((-24, 19.946258544, -18.760900459), (0, 1, 0)), 270), axis=Axis((-24, 19.946258544, -18.760900459), (0, 1, 0)))


solid = part_1.part
